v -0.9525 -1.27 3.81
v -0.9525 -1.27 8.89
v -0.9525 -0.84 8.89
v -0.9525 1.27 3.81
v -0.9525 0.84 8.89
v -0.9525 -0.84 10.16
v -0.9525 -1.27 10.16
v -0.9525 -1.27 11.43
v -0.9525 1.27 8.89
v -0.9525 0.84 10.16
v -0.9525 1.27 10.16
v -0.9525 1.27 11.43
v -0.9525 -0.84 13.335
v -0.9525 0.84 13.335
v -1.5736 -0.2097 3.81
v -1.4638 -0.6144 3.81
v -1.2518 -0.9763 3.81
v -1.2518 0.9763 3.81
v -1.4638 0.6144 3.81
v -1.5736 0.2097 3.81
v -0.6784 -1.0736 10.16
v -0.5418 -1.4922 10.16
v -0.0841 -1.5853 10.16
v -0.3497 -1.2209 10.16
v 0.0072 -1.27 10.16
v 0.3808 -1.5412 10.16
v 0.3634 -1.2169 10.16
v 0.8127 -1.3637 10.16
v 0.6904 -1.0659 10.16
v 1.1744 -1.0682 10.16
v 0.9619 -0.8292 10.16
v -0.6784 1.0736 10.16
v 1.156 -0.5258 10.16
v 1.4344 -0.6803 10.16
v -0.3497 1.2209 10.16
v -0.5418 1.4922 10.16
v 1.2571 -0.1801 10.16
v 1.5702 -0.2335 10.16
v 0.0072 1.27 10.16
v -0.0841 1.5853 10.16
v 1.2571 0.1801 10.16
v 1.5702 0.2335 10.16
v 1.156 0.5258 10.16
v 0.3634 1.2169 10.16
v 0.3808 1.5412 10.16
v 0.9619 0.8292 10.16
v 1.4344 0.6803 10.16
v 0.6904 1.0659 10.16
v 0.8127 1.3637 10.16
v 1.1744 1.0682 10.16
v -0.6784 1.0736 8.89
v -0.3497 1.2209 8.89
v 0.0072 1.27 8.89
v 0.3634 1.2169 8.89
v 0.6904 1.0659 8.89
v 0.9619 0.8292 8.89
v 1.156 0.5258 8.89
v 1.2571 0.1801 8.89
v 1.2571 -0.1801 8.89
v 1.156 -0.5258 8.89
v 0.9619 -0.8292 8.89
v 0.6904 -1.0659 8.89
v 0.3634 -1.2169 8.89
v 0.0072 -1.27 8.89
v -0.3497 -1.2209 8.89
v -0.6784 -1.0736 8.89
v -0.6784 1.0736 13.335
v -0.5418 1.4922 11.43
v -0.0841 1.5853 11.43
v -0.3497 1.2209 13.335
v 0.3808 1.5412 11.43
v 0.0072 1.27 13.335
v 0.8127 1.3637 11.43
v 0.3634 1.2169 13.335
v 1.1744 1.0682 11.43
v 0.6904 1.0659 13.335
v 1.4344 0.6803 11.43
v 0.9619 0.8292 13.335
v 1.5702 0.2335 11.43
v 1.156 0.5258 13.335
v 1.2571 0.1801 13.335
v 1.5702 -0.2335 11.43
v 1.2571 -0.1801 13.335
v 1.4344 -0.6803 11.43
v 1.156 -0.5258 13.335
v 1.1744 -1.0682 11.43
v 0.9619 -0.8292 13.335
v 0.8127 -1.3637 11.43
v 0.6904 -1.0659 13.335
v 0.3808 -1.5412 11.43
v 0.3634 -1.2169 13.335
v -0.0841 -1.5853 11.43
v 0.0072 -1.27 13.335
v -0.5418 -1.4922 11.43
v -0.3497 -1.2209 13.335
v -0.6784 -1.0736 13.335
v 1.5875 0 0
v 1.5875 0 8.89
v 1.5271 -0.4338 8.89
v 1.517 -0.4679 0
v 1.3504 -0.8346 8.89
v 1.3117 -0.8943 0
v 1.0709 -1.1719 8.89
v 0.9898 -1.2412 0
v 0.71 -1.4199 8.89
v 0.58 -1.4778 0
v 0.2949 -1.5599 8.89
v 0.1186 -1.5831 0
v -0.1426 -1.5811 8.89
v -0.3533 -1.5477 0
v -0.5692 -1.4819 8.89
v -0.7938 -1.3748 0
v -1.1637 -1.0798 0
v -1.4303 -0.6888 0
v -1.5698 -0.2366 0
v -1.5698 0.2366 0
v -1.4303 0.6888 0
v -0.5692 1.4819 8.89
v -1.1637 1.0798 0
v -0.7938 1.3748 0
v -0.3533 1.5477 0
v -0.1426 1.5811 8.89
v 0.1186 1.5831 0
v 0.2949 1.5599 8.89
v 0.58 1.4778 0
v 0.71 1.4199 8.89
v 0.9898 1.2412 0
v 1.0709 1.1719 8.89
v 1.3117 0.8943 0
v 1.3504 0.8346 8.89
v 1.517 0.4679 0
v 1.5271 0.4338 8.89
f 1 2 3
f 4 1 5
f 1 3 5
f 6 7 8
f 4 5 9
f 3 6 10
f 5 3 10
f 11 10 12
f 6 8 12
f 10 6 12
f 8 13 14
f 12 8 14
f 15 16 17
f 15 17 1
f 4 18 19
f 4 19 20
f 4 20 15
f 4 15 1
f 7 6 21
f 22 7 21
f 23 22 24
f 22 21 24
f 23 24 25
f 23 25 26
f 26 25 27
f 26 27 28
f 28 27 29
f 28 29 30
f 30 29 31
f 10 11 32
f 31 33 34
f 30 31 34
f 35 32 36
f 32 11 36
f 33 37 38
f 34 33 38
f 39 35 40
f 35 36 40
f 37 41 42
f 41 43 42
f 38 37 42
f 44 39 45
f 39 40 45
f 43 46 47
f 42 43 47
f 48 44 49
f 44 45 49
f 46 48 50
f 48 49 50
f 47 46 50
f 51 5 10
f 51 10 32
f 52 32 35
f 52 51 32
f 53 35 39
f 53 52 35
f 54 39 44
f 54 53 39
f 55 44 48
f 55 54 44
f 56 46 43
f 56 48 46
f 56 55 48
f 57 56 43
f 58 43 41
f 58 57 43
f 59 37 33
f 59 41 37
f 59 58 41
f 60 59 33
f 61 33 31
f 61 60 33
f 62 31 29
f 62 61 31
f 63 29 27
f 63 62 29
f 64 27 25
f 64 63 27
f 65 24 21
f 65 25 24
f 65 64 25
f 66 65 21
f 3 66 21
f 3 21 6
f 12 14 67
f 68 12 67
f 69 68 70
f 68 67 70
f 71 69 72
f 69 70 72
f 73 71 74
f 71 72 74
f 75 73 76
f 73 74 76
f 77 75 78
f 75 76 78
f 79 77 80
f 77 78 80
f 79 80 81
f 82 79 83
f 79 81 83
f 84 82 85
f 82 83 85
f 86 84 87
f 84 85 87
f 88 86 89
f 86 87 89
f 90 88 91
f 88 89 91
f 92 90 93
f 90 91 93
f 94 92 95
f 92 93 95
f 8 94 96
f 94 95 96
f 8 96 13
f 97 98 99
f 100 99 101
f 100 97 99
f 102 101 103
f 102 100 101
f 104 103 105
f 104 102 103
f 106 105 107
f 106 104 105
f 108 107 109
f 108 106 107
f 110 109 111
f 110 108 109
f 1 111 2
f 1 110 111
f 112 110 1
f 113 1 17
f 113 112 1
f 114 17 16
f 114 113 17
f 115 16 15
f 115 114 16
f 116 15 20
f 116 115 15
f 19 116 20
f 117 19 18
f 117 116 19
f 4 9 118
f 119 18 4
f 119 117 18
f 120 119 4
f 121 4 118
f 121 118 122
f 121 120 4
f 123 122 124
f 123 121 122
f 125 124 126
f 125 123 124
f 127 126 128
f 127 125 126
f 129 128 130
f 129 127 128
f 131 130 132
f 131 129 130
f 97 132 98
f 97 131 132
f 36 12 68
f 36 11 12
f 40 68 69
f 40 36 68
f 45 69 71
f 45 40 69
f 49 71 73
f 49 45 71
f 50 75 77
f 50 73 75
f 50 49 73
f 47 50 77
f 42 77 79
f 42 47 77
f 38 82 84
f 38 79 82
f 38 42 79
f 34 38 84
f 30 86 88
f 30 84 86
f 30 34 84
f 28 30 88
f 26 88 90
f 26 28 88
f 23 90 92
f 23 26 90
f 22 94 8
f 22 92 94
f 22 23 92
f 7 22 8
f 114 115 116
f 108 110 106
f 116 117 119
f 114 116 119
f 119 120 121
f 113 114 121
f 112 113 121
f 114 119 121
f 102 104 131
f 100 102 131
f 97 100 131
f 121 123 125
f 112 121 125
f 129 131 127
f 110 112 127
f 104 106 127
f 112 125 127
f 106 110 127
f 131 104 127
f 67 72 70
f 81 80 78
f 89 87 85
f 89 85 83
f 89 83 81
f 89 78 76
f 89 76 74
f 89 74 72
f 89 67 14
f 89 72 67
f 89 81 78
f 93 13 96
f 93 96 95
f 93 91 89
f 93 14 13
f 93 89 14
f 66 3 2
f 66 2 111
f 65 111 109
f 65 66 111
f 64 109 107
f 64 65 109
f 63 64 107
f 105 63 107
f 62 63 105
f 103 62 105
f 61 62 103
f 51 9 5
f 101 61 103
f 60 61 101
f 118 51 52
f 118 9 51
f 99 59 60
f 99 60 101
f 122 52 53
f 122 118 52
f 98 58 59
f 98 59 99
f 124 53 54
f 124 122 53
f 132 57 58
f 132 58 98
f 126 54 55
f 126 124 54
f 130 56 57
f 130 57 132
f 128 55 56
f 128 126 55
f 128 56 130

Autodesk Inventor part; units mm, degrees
ref_plane "YZ Plane" through (0, 0, 0) normal (1, 0, 0) x (0, 1, 0)
ref_plane "XZ Plane" through (0, 0, 0) normal (0, 1, 0) x (-1, 0, 0)
sketch "Sketch1" plane through (0, 0, 0) normal (0, 0, 1) x (1, 0, 0)
  circle A0 centre (0, 0) radius 1.5875
  dimension "d0" = 3.175
extrude "Extrusion1" add sketch "Sketch1" along normal blind 3.81
sketch "Sketch2" plane through (0, 0, 3.81) normal (0, 0, 1) x (1, 0, 0)
  circle A0 centre (0, 0) radius 1.5875 projected
  line L0 (-0.9525, 1.27) -> (-0.9525, -1.27)
  arc A1 (-0.9525, -1.27) -> (-0.9525, 1.27) centre (0, 0) ccw
  point P0 (1.5875, 0)
  point P1 (-0.9525, 0)
  dimension "d4" = 2.54
extrude "Extrusion2" add sketch "Sketch2" along normal blind 5.08 contours A0 L0 picked at (0.1068, 0.3913)
sketch "Sketch3" plane through (0, 0, 8.89) normal (0, 0, 1) x (1, 0, 0)
  arc A0 (-0.9525, -1.27) -> (-0.9525, 1.27) centre (0, 0) ccw projected
  line L0 (-0.9525, 1.27) -> (-0.9525, -1.27) projected
  arc A1 (-0.9525, -0.84) -> (-0.9525, 0.84) centre (0, 0) ccw
  line L1 (-0.9525, 0.84) -> (-0.9525, -0.84)
  dimension "d8" = 2.54
extrude "Extrusion3" add sketch "Sketch3" along normal blind 1.27 contours L0 A1
sketch "Sketch4" plane through (0, 0, 10.16) normal (0, 0, 1) x (1, 0, 0)
  line L0 (-0.9525, 0.84) -> (-0.9525, -0.84) projected
  arc A0 (-0.9525, -0.84) -> (-0.9525, 0.84) centre (0, 0) ccw projected
  arc A1 (-0.9525, -1.27) -> (-0.9525, 1.27) centre (0, 0) ccw
  line L1 (-0.9525, 1.27) -> (-0.9525, -1.27)
  dimension "d12" = 3.175
extrude "Extrusion4" add sketch "Sketch4" along normal blind 1.27
ref_plane "Work Plane1" through (0, 0, 13.335) normal (0, 0, 1) x (1, 0, 0)
sketch "Sketch5" plane through (0, 0, 13.335) normal (0, 0, 1) x (1, 0, 0)
  arc A0 (-0.9525, -0.84) -> (-0.9525, 0.84) centre (0, 0) ccw
  line L0 (-0.9525, 0.84) -> (-0.9525, -0.84)
  point P0 (1.5875, 0)
  point P1 (-0.9525, 0)
  dimension "d17" = 2.54
  dimension "d19" = 1.5875
  dimension "d20" = 2.54
sketch "Sketch6" plane through (0, 0, 11.43) normal (0, 0, 1) x (1, 0, 0)
  arc A0 (-0.9525, -1.27) -> (-0.9525, 1.27) centre (0, 0) ccw projected
  line L0 (-0.9525, 1.27) -> (-0.9525, -1.27) projected
loft "Loft1" add profiles "Sketch5" section 1 edges at (1.5875, 0, 11.43) (-0.9525, 0, 11.43)
properties part number "Lg Motor Shaft" material "Stainless Steel"
